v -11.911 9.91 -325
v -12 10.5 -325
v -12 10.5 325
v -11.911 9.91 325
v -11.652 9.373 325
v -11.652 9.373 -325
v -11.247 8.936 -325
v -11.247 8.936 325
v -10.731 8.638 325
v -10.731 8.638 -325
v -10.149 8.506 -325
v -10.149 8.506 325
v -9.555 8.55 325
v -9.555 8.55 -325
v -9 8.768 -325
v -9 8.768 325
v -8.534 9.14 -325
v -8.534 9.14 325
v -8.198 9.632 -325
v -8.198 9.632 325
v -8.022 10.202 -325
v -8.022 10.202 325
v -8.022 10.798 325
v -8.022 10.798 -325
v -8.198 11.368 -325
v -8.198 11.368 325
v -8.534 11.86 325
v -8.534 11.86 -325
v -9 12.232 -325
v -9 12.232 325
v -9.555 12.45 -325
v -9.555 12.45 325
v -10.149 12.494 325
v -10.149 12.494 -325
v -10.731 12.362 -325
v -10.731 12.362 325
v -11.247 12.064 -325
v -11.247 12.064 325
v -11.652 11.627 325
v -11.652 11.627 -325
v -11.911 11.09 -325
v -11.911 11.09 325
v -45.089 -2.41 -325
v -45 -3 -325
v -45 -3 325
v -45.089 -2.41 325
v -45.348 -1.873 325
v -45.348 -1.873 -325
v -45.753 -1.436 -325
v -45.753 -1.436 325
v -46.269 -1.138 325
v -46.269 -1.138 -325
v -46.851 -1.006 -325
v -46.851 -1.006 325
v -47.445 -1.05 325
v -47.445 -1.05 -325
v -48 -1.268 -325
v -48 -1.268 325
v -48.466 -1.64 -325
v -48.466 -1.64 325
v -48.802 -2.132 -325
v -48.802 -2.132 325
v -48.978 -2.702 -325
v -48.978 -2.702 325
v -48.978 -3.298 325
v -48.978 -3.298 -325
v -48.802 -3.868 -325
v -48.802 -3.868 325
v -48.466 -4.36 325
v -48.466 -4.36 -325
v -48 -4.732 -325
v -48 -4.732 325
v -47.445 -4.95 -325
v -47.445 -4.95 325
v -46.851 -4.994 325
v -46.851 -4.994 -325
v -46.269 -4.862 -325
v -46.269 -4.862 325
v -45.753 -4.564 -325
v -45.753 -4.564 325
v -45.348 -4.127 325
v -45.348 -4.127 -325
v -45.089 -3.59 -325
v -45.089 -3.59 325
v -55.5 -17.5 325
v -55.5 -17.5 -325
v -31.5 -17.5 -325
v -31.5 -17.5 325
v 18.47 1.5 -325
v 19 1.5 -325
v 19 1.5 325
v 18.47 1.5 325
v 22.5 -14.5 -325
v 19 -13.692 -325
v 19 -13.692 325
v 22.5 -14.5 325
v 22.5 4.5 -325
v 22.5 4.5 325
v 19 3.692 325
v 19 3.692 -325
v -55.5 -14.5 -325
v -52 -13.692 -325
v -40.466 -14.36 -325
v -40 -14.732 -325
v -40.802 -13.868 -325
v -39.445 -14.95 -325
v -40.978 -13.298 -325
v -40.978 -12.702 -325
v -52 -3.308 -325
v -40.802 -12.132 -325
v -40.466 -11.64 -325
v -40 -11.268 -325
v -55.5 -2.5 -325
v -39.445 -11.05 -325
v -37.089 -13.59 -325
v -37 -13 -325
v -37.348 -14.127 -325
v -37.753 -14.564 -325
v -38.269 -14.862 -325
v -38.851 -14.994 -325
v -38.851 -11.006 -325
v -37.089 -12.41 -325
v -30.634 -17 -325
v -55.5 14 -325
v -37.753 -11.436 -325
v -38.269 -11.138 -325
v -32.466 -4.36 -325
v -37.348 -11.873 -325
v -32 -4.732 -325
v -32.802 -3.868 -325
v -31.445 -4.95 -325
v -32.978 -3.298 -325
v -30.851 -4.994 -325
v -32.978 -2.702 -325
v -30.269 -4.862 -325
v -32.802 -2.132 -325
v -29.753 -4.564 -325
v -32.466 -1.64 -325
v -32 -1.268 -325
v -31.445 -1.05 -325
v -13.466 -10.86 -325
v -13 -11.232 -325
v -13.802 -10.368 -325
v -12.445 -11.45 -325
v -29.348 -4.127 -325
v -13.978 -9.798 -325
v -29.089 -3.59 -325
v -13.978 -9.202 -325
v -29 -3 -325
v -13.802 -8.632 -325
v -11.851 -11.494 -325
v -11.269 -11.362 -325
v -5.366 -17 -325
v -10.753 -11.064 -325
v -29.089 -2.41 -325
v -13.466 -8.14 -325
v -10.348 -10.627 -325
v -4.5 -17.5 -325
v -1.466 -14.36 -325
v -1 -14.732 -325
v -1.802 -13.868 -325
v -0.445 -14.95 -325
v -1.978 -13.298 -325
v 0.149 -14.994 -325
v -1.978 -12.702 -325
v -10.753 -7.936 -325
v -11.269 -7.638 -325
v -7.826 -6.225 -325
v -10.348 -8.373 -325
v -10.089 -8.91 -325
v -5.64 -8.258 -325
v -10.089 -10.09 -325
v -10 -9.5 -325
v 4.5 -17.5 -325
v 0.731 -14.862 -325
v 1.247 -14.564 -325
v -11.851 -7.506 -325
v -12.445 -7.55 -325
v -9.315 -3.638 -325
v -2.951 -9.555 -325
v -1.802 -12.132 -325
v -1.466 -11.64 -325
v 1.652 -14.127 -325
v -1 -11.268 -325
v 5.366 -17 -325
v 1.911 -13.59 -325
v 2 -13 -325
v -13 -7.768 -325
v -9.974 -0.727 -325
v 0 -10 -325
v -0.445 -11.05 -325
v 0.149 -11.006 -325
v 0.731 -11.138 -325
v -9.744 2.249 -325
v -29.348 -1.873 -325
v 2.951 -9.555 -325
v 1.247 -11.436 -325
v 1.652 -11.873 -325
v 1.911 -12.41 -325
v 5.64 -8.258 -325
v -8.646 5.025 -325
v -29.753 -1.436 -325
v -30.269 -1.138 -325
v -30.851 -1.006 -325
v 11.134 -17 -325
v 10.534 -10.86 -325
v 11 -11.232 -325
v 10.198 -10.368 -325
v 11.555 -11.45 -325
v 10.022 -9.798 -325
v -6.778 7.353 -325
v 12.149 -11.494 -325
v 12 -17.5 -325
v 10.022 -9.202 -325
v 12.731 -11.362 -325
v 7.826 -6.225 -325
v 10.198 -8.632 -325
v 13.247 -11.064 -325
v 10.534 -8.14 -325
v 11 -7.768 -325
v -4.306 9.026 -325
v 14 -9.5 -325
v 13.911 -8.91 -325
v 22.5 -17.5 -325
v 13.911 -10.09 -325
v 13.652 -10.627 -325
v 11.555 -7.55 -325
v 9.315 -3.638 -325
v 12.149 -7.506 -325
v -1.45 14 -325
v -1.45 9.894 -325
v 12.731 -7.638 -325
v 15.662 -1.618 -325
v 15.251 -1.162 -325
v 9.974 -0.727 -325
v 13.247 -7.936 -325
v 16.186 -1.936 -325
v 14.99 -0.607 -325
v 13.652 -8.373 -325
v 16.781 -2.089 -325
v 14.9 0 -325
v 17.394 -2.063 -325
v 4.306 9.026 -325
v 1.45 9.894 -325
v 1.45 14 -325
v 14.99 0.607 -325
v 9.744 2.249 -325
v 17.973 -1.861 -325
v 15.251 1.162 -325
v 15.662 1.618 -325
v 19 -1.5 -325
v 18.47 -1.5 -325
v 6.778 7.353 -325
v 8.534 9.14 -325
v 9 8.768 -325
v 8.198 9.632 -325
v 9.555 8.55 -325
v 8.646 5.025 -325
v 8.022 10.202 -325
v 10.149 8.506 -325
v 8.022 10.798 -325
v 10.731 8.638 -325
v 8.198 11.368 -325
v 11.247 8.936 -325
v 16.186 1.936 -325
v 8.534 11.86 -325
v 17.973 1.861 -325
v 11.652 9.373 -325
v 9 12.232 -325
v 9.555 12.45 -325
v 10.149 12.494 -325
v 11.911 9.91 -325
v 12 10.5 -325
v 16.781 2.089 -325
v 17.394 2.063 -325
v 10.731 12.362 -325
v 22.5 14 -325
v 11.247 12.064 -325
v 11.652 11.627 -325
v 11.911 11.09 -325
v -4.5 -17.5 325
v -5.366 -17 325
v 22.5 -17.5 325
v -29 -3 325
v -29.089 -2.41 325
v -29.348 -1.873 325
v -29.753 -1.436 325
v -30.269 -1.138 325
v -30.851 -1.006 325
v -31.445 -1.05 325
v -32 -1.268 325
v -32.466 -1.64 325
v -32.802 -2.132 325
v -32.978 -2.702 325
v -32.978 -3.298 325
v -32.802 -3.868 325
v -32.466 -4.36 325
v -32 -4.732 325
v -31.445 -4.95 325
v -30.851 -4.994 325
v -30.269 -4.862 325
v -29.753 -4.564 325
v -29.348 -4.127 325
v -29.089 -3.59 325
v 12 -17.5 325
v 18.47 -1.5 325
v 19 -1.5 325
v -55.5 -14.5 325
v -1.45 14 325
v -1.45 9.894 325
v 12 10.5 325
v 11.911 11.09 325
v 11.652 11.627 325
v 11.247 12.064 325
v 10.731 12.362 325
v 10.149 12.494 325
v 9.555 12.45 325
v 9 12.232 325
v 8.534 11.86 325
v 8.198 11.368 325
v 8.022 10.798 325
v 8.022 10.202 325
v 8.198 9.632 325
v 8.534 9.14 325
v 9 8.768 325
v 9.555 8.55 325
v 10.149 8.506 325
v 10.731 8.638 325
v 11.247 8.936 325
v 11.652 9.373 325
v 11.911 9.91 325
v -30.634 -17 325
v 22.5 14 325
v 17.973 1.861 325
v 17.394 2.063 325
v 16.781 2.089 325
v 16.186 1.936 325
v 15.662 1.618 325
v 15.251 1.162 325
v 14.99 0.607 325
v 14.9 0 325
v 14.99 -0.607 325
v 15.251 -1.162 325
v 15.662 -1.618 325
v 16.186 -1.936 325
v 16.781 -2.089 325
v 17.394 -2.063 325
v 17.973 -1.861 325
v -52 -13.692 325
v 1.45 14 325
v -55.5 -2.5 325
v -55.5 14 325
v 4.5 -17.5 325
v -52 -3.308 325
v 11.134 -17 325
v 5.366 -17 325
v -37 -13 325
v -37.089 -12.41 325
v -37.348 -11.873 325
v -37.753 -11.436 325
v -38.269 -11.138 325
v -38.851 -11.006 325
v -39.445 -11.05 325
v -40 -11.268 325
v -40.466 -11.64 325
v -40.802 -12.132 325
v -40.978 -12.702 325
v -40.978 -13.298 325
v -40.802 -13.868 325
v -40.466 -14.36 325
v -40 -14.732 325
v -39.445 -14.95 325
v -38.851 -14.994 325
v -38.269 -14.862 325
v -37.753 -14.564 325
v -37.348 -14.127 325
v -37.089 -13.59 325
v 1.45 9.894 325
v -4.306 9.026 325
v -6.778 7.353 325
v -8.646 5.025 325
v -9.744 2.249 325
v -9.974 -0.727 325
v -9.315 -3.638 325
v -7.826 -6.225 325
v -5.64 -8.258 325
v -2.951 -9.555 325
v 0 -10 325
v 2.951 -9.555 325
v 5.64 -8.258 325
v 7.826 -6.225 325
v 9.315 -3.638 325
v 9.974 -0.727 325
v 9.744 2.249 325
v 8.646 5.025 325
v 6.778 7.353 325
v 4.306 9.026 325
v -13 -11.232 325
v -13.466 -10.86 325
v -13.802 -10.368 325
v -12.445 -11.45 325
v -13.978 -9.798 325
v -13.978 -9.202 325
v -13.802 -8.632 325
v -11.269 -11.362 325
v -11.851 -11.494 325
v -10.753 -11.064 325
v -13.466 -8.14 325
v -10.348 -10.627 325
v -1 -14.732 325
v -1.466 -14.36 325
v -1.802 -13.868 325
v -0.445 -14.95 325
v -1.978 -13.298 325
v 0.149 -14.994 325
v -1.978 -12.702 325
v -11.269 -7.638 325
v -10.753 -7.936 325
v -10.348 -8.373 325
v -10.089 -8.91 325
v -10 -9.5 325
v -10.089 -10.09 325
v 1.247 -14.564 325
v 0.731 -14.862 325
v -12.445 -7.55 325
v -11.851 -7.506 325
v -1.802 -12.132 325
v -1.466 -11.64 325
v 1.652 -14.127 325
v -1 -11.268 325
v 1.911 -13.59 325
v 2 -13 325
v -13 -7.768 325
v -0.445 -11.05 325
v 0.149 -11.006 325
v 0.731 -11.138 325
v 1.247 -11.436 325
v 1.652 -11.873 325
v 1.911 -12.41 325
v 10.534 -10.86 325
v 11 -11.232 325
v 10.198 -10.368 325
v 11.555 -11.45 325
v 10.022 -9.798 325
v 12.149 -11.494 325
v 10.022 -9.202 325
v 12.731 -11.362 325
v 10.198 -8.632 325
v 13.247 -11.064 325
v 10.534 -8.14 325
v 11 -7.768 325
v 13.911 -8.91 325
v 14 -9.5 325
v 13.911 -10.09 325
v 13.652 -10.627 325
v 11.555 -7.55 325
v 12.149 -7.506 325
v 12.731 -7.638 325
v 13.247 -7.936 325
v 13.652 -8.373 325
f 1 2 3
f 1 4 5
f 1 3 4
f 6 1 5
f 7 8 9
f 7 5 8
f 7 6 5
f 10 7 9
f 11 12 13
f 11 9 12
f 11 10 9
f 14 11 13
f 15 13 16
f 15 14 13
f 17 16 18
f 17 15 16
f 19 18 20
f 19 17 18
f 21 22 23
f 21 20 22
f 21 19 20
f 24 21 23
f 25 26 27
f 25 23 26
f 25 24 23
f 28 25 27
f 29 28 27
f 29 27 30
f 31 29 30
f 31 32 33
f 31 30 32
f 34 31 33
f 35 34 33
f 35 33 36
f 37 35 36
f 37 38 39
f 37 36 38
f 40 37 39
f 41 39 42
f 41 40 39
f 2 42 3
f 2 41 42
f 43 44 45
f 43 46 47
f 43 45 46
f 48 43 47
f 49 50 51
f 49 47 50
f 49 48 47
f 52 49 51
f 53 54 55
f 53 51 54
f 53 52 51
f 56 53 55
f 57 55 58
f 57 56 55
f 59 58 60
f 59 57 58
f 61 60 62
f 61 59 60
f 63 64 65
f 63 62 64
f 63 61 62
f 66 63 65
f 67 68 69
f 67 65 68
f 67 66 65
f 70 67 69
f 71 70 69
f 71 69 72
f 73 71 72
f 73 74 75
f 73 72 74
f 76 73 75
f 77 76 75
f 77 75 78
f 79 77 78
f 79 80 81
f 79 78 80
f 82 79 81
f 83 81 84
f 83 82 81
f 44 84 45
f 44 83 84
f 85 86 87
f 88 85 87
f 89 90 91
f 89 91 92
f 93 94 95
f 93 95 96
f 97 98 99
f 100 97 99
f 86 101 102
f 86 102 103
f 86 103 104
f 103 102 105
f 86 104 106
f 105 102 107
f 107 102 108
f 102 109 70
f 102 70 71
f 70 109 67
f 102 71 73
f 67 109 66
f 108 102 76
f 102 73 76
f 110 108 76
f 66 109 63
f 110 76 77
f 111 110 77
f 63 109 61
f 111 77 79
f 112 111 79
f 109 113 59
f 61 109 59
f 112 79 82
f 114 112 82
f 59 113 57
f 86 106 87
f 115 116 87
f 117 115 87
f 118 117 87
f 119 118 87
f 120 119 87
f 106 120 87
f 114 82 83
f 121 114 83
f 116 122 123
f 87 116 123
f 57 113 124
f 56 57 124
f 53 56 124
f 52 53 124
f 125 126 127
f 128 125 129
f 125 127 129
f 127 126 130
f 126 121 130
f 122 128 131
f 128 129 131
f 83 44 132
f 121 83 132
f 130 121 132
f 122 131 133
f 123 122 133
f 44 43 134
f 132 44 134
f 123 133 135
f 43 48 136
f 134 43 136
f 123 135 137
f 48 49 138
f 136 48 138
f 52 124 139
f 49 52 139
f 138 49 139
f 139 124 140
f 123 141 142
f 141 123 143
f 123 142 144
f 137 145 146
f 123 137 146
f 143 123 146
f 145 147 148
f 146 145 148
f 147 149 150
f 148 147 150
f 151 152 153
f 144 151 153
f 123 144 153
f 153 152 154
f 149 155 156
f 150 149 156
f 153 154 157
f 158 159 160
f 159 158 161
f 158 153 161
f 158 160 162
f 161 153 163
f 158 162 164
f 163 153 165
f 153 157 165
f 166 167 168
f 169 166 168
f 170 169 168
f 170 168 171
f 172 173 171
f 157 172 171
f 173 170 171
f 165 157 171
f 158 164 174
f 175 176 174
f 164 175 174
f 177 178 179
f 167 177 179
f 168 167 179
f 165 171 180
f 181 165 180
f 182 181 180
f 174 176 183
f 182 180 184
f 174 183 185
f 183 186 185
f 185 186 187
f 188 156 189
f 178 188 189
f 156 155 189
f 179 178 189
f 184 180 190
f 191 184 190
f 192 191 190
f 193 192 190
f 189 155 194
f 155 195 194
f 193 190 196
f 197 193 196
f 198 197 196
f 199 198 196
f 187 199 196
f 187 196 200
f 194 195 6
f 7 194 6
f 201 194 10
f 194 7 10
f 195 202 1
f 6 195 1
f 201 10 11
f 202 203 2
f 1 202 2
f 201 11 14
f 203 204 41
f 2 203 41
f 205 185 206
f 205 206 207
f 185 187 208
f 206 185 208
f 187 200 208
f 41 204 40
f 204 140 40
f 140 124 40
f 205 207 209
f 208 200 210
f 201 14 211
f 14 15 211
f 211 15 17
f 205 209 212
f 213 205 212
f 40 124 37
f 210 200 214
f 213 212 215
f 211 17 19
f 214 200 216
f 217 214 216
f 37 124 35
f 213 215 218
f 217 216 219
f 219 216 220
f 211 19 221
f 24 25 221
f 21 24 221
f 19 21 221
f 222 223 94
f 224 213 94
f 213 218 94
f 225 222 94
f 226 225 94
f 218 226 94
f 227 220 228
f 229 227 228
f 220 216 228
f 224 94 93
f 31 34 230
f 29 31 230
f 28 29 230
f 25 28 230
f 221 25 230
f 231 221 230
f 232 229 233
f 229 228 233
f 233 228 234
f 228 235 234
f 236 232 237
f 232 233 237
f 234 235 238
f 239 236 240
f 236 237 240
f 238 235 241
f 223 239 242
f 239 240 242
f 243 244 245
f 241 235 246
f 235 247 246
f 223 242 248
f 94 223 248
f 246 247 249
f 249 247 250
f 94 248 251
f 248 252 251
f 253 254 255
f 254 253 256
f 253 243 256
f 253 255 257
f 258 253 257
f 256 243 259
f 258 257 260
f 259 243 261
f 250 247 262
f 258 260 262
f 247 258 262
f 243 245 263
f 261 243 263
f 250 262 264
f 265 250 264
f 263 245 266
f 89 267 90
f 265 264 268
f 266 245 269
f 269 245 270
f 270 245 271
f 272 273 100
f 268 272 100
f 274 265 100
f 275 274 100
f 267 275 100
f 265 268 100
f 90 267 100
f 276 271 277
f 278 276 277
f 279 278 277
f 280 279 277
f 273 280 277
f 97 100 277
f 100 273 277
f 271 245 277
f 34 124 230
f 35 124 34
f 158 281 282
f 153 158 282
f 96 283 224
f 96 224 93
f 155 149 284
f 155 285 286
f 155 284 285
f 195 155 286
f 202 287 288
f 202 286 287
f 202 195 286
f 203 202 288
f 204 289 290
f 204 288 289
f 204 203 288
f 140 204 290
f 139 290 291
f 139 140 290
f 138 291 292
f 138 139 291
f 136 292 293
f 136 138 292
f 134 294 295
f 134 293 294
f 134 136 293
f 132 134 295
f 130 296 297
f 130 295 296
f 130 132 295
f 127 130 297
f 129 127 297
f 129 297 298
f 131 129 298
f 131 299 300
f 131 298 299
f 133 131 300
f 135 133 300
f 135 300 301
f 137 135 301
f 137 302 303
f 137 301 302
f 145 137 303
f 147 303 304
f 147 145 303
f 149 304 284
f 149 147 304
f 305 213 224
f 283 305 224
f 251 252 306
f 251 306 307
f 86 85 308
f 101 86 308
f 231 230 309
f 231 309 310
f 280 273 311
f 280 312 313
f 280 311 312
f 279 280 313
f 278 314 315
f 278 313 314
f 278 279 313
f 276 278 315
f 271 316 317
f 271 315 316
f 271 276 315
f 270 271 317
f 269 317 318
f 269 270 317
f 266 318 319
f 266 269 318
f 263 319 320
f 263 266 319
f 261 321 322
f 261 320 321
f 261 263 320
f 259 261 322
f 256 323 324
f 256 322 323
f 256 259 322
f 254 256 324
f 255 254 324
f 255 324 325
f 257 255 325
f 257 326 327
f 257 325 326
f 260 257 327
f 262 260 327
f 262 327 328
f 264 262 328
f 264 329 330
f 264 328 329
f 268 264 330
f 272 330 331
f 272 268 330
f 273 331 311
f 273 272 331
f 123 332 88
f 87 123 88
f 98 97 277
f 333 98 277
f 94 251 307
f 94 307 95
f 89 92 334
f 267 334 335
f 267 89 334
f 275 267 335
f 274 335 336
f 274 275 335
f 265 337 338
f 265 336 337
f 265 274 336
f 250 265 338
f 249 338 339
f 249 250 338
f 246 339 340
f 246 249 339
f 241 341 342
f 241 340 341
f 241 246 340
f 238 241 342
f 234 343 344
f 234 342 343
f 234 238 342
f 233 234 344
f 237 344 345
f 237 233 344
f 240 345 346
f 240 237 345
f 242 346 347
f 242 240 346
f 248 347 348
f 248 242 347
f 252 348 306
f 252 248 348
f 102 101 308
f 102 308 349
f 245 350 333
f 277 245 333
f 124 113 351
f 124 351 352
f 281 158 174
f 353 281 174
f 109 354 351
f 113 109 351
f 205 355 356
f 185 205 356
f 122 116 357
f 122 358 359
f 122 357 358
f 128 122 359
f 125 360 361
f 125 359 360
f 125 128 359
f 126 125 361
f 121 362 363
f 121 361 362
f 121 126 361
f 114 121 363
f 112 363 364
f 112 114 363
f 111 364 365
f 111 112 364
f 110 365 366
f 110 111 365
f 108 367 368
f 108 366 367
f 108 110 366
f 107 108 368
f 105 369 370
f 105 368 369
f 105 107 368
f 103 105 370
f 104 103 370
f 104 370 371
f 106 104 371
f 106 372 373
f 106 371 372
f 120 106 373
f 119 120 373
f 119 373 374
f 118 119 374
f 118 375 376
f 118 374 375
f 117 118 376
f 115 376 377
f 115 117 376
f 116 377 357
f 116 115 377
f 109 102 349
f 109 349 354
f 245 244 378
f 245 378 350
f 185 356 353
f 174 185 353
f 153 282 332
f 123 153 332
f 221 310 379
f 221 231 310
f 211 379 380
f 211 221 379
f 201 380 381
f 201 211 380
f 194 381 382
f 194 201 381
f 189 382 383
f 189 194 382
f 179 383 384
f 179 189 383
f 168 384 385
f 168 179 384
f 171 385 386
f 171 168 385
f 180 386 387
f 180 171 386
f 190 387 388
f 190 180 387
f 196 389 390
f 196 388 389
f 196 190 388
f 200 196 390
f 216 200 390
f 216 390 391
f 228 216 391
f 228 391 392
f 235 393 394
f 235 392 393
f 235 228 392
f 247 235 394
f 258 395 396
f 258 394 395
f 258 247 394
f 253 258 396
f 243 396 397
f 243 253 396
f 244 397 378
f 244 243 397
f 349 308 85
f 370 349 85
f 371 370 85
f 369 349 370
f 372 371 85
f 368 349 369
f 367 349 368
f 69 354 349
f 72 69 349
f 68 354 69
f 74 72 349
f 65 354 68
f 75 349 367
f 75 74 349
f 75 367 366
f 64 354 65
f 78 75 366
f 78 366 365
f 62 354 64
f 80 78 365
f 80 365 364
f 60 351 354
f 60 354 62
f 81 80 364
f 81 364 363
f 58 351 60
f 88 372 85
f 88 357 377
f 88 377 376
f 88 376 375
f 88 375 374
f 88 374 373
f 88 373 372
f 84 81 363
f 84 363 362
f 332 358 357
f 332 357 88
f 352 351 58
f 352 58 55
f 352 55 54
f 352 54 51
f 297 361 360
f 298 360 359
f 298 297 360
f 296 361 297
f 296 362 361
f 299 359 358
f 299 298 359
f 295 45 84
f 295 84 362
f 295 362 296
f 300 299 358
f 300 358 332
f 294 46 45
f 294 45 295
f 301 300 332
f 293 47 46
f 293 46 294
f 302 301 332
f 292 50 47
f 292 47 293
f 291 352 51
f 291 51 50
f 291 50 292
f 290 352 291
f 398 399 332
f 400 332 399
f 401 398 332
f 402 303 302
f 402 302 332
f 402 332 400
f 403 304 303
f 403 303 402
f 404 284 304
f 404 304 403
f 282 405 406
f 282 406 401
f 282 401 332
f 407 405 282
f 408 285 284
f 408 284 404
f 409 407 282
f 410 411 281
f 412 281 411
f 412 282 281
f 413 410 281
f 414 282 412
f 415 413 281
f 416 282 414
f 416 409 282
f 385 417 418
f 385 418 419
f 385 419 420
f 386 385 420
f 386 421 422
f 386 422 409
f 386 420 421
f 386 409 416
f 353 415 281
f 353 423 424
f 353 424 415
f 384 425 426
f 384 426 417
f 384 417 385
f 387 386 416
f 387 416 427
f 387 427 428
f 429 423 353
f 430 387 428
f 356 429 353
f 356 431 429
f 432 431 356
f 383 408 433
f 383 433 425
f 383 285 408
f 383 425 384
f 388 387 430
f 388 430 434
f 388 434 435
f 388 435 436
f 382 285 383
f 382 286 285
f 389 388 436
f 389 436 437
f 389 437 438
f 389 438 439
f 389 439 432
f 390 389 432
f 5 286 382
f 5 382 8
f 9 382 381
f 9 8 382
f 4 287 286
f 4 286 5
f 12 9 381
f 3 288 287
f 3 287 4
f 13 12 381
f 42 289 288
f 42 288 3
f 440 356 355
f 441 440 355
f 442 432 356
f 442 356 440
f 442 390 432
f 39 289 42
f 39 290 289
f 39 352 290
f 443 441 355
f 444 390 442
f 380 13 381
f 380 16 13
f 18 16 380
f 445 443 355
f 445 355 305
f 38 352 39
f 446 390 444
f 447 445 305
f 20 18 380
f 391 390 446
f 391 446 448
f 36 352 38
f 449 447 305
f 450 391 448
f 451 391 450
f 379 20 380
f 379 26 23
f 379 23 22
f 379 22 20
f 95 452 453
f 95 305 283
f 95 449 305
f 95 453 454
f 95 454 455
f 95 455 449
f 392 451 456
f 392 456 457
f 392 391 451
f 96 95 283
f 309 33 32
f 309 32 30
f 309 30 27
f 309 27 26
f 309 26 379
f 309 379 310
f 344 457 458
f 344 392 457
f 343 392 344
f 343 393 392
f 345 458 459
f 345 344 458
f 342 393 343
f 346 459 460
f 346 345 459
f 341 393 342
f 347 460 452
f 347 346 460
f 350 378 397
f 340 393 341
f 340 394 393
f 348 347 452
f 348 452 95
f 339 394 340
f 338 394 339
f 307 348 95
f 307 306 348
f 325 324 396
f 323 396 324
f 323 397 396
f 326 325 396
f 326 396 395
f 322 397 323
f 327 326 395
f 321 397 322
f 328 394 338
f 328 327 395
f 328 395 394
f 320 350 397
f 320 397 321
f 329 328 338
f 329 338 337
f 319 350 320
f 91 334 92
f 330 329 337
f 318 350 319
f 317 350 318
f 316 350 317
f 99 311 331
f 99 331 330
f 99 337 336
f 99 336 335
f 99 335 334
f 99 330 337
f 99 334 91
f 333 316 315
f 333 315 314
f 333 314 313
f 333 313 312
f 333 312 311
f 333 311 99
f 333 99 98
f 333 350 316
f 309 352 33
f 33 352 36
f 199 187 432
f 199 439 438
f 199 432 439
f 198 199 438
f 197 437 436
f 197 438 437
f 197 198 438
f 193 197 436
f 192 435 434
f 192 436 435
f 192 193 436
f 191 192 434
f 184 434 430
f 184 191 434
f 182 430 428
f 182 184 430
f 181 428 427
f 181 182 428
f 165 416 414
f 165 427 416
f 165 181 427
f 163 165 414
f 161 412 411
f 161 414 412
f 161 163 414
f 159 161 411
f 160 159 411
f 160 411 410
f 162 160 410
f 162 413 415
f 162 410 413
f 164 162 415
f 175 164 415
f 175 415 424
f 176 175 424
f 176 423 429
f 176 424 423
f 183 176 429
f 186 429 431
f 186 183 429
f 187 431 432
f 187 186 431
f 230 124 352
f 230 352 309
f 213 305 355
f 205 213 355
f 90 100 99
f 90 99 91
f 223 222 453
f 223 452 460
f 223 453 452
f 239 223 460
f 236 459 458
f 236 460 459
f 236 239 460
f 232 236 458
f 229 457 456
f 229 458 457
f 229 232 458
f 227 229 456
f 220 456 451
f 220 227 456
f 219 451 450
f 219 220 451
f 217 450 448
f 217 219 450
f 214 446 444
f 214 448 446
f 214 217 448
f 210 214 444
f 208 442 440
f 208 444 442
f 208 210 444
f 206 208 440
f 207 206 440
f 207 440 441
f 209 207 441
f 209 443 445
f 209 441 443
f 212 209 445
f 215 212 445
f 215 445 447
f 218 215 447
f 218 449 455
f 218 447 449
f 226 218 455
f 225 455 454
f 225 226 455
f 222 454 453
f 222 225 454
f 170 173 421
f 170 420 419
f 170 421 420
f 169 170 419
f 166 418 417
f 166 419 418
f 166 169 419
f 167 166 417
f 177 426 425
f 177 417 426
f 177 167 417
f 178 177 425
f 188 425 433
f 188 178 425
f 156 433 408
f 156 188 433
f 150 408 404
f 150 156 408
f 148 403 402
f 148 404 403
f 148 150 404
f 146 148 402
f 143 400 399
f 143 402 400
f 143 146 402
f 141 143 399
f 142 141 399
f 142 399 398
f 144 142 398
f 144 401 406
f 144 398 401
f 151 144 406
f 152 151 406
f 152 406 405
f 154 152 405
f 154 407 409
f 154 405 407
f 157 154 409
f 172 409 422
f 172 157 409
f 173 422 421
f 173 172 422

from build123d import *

# Parameters (mm, degrees)
BASE_DEPTH                = 325
BASE_DEPTH_BACK           = 325
BASE_SKETCH_W             = 78
BASE_SKETCH_H             = 31.5
BASE_SKETCH_R             = 10
BASE_GROOVE_DEPTH         = 331.168896173
BASE_GROOVE_DEPTH_BACK    = 331.168896173
SEAL_GROOVE_DEPTH         = 331.168896173
SEAL_GROOVE_DEPTH_BACK    = 331.168896173
HOLES_DEPTH               = 331.168896173
HOLES_DEPTH_BACK          = 331.168896173
HOLES_SKETCH_R            = 2
SWITCH_GROOVE1_DEPTH      = 331.168896173
SWITCH_GROOVE1_DEPTH_BACK = 331.168896173
SIDE_GROOVE1_DEPTH        = 331.168896173
SIDE_GROOVE1_DEPTH_BACK   = 331.168896173
SIDE_GROOVE2_DEPTH        = 331.168896173
SIDE_GROOVE2_DEPTH_BACK   = 331.168896173


with BuildPart() as part:
    # Base_Sketch → Base (new, two sides: drawn at the far end of the back side and taken through both)
    with BuildSketch(Plane.XY.offset(-BASE_DEPTH_BACK)):
        with Locations((-16.5, -1.75)):
            Rectangle(BASE_SKETCH_W, BASE_SKETCH_H)
        Circle(BASE_SKETCH_R, mode=Mode.SUBTRACT)
    extrude(amount=BASE_DEPTH + BASE_DEPTH_BACK)

    # Base_Groove_Sketch → Base_Groove (cut, two sides: drawn at the far end of the back side and taken through both)
    with BuildSketch(Plane.XY.offset(-BASE_GROOVE_DEPTH_BACK)):
        Polygon((12, -17.5), (11.133974596, -17), (5.366025404, -17), (4.5, -17.5), align=None)
        Polygon((-4.5, -17.5), (-5.366025404, -17), (-30.633974596, -17), (-31.5, -17.5), align=None)
    extrude(amount=BASE_GROOVE_DEPTH + BASE_GROOVE_DEPTH_BACK, mode=Mode.SUBTRACT)

    # Seal_Groove_Sketch → Seal_Groove (cut, two sides: drawn at the far end of the back side and taken through both)
    with BuildSketch(Plane.XY.offset(-SEAL_GROOVE_DEPTH_BACK)):
        with BuildLine():
            Line((-1.45, 14), (-1.45, 9.89431655))
            ThreePointArc((-1.45, 9.89431655), (0, 10), (1.45, 9.89431655))
            Line((1.45, 9.89431655), (1.45, 14))
            Line((1.45, 14), (-1.45, 14))
        make_face()
    extrude(amount=SEAL_GROOVE_DEPTH + SEAL_GROOVE_DEPTH_BACK, mode=Mode.SUBTRACT)

    # Holes_Sketch → Holes (cut, two sides: drawn at the far end of the back side and taken through both)
    with BuildSketch(Plane.XY.offset(-HOLES_DEPTH_BACK)):
        with Locations((12, -9.5)):
            Circle(HOLES_SKETCH_R)
        with Locations((-12, -9.5)):
            Circle(HOLES_SKETCH_R)
        with Locations((10, 10.5)):
            Circle(HOLES_SKETCH_R)
        with Locations(Location((-10, 10.5, 0), (0, 0, 180))):
            Circle(HOLES_SKETCH_R)
        with Locations((0, -13)):
            Circle(HOLES_SKETCH_R)
        with Locations((-31, -3)):
            Circle(HOLES_SKETCH_R)
        with Locations((-47, -3)):
            Circle(HOLES_SKETCH_R)
        with Locations((-39, -13)):
            Circle(HOLES_SKETCH_R)
    extrude(amount=HOLES_DEPTH + HOLES_DEPTH_BACK, mode=Mode.SUBTRACT)

    # Switch_Groove1_Sketch (on Front Plane) → Switch_Groove1 (cut, two sides: drawn at the far end of the back side and taken through both)
    with BuildSketch(Plane.XY.offset(-SWITCH_GROOVE1_DEPTH_BACK)):
        with BuildLine():
            Line((22.5, 1.5), (18.469693846, 1.5))
            ThreePointArc((18.469693846, 1.5), (14.9, 0), (18.469693846, -1.5))
            Line((18.469693846, -1.5), (22.5, -1.5))
            Line((22.5, -1.5), (22.5, 1.5))
        make_face()
    extrude(amount=SWITCH_GROOVE1_DEPTH + SWITCH_GROOVE1_DEPTH_BACK, mode=Mode.SUBTRACT)

    # Side_Groove1_Sketch → Side_Groove1 (cut, two sides: drawn at the far end of the back side and taken through both)
    with BuildSketch(Plane.XY.offset(-SIDE_GROOVE1_DEPTH_BACK)):
        Polygon((-55.5, -14.5), (-52, -13.691961331), (-52, -3.308038669), (-55.5, -2.5), align=None)
    extrude(amount=SIDE_GROOVE1_DEPTH + SIDE_GROOVE1_DEPTH_BACK, mode=Mode.SUBTRACT)

    # Side_Groove2_Sketch → Side_Groove2 (cut, two sides: drawn at the far end of the back side and taken through both)
    with BuildSketch(Plane.XY.offset(-SIDE_GROOVE2_DEPTH_BACK)):
        Polygon((22.5, 4.5), (19, 3.691961331), (19, -13.691961331), (22.5, -14.5), align=None)
    extrude(amount=SIDE_GROOVE2_DEPTH + SIDE_GROOVE2_DEPTH_BACK, mode=Mode.SUBTRACT)


solid = part.part
